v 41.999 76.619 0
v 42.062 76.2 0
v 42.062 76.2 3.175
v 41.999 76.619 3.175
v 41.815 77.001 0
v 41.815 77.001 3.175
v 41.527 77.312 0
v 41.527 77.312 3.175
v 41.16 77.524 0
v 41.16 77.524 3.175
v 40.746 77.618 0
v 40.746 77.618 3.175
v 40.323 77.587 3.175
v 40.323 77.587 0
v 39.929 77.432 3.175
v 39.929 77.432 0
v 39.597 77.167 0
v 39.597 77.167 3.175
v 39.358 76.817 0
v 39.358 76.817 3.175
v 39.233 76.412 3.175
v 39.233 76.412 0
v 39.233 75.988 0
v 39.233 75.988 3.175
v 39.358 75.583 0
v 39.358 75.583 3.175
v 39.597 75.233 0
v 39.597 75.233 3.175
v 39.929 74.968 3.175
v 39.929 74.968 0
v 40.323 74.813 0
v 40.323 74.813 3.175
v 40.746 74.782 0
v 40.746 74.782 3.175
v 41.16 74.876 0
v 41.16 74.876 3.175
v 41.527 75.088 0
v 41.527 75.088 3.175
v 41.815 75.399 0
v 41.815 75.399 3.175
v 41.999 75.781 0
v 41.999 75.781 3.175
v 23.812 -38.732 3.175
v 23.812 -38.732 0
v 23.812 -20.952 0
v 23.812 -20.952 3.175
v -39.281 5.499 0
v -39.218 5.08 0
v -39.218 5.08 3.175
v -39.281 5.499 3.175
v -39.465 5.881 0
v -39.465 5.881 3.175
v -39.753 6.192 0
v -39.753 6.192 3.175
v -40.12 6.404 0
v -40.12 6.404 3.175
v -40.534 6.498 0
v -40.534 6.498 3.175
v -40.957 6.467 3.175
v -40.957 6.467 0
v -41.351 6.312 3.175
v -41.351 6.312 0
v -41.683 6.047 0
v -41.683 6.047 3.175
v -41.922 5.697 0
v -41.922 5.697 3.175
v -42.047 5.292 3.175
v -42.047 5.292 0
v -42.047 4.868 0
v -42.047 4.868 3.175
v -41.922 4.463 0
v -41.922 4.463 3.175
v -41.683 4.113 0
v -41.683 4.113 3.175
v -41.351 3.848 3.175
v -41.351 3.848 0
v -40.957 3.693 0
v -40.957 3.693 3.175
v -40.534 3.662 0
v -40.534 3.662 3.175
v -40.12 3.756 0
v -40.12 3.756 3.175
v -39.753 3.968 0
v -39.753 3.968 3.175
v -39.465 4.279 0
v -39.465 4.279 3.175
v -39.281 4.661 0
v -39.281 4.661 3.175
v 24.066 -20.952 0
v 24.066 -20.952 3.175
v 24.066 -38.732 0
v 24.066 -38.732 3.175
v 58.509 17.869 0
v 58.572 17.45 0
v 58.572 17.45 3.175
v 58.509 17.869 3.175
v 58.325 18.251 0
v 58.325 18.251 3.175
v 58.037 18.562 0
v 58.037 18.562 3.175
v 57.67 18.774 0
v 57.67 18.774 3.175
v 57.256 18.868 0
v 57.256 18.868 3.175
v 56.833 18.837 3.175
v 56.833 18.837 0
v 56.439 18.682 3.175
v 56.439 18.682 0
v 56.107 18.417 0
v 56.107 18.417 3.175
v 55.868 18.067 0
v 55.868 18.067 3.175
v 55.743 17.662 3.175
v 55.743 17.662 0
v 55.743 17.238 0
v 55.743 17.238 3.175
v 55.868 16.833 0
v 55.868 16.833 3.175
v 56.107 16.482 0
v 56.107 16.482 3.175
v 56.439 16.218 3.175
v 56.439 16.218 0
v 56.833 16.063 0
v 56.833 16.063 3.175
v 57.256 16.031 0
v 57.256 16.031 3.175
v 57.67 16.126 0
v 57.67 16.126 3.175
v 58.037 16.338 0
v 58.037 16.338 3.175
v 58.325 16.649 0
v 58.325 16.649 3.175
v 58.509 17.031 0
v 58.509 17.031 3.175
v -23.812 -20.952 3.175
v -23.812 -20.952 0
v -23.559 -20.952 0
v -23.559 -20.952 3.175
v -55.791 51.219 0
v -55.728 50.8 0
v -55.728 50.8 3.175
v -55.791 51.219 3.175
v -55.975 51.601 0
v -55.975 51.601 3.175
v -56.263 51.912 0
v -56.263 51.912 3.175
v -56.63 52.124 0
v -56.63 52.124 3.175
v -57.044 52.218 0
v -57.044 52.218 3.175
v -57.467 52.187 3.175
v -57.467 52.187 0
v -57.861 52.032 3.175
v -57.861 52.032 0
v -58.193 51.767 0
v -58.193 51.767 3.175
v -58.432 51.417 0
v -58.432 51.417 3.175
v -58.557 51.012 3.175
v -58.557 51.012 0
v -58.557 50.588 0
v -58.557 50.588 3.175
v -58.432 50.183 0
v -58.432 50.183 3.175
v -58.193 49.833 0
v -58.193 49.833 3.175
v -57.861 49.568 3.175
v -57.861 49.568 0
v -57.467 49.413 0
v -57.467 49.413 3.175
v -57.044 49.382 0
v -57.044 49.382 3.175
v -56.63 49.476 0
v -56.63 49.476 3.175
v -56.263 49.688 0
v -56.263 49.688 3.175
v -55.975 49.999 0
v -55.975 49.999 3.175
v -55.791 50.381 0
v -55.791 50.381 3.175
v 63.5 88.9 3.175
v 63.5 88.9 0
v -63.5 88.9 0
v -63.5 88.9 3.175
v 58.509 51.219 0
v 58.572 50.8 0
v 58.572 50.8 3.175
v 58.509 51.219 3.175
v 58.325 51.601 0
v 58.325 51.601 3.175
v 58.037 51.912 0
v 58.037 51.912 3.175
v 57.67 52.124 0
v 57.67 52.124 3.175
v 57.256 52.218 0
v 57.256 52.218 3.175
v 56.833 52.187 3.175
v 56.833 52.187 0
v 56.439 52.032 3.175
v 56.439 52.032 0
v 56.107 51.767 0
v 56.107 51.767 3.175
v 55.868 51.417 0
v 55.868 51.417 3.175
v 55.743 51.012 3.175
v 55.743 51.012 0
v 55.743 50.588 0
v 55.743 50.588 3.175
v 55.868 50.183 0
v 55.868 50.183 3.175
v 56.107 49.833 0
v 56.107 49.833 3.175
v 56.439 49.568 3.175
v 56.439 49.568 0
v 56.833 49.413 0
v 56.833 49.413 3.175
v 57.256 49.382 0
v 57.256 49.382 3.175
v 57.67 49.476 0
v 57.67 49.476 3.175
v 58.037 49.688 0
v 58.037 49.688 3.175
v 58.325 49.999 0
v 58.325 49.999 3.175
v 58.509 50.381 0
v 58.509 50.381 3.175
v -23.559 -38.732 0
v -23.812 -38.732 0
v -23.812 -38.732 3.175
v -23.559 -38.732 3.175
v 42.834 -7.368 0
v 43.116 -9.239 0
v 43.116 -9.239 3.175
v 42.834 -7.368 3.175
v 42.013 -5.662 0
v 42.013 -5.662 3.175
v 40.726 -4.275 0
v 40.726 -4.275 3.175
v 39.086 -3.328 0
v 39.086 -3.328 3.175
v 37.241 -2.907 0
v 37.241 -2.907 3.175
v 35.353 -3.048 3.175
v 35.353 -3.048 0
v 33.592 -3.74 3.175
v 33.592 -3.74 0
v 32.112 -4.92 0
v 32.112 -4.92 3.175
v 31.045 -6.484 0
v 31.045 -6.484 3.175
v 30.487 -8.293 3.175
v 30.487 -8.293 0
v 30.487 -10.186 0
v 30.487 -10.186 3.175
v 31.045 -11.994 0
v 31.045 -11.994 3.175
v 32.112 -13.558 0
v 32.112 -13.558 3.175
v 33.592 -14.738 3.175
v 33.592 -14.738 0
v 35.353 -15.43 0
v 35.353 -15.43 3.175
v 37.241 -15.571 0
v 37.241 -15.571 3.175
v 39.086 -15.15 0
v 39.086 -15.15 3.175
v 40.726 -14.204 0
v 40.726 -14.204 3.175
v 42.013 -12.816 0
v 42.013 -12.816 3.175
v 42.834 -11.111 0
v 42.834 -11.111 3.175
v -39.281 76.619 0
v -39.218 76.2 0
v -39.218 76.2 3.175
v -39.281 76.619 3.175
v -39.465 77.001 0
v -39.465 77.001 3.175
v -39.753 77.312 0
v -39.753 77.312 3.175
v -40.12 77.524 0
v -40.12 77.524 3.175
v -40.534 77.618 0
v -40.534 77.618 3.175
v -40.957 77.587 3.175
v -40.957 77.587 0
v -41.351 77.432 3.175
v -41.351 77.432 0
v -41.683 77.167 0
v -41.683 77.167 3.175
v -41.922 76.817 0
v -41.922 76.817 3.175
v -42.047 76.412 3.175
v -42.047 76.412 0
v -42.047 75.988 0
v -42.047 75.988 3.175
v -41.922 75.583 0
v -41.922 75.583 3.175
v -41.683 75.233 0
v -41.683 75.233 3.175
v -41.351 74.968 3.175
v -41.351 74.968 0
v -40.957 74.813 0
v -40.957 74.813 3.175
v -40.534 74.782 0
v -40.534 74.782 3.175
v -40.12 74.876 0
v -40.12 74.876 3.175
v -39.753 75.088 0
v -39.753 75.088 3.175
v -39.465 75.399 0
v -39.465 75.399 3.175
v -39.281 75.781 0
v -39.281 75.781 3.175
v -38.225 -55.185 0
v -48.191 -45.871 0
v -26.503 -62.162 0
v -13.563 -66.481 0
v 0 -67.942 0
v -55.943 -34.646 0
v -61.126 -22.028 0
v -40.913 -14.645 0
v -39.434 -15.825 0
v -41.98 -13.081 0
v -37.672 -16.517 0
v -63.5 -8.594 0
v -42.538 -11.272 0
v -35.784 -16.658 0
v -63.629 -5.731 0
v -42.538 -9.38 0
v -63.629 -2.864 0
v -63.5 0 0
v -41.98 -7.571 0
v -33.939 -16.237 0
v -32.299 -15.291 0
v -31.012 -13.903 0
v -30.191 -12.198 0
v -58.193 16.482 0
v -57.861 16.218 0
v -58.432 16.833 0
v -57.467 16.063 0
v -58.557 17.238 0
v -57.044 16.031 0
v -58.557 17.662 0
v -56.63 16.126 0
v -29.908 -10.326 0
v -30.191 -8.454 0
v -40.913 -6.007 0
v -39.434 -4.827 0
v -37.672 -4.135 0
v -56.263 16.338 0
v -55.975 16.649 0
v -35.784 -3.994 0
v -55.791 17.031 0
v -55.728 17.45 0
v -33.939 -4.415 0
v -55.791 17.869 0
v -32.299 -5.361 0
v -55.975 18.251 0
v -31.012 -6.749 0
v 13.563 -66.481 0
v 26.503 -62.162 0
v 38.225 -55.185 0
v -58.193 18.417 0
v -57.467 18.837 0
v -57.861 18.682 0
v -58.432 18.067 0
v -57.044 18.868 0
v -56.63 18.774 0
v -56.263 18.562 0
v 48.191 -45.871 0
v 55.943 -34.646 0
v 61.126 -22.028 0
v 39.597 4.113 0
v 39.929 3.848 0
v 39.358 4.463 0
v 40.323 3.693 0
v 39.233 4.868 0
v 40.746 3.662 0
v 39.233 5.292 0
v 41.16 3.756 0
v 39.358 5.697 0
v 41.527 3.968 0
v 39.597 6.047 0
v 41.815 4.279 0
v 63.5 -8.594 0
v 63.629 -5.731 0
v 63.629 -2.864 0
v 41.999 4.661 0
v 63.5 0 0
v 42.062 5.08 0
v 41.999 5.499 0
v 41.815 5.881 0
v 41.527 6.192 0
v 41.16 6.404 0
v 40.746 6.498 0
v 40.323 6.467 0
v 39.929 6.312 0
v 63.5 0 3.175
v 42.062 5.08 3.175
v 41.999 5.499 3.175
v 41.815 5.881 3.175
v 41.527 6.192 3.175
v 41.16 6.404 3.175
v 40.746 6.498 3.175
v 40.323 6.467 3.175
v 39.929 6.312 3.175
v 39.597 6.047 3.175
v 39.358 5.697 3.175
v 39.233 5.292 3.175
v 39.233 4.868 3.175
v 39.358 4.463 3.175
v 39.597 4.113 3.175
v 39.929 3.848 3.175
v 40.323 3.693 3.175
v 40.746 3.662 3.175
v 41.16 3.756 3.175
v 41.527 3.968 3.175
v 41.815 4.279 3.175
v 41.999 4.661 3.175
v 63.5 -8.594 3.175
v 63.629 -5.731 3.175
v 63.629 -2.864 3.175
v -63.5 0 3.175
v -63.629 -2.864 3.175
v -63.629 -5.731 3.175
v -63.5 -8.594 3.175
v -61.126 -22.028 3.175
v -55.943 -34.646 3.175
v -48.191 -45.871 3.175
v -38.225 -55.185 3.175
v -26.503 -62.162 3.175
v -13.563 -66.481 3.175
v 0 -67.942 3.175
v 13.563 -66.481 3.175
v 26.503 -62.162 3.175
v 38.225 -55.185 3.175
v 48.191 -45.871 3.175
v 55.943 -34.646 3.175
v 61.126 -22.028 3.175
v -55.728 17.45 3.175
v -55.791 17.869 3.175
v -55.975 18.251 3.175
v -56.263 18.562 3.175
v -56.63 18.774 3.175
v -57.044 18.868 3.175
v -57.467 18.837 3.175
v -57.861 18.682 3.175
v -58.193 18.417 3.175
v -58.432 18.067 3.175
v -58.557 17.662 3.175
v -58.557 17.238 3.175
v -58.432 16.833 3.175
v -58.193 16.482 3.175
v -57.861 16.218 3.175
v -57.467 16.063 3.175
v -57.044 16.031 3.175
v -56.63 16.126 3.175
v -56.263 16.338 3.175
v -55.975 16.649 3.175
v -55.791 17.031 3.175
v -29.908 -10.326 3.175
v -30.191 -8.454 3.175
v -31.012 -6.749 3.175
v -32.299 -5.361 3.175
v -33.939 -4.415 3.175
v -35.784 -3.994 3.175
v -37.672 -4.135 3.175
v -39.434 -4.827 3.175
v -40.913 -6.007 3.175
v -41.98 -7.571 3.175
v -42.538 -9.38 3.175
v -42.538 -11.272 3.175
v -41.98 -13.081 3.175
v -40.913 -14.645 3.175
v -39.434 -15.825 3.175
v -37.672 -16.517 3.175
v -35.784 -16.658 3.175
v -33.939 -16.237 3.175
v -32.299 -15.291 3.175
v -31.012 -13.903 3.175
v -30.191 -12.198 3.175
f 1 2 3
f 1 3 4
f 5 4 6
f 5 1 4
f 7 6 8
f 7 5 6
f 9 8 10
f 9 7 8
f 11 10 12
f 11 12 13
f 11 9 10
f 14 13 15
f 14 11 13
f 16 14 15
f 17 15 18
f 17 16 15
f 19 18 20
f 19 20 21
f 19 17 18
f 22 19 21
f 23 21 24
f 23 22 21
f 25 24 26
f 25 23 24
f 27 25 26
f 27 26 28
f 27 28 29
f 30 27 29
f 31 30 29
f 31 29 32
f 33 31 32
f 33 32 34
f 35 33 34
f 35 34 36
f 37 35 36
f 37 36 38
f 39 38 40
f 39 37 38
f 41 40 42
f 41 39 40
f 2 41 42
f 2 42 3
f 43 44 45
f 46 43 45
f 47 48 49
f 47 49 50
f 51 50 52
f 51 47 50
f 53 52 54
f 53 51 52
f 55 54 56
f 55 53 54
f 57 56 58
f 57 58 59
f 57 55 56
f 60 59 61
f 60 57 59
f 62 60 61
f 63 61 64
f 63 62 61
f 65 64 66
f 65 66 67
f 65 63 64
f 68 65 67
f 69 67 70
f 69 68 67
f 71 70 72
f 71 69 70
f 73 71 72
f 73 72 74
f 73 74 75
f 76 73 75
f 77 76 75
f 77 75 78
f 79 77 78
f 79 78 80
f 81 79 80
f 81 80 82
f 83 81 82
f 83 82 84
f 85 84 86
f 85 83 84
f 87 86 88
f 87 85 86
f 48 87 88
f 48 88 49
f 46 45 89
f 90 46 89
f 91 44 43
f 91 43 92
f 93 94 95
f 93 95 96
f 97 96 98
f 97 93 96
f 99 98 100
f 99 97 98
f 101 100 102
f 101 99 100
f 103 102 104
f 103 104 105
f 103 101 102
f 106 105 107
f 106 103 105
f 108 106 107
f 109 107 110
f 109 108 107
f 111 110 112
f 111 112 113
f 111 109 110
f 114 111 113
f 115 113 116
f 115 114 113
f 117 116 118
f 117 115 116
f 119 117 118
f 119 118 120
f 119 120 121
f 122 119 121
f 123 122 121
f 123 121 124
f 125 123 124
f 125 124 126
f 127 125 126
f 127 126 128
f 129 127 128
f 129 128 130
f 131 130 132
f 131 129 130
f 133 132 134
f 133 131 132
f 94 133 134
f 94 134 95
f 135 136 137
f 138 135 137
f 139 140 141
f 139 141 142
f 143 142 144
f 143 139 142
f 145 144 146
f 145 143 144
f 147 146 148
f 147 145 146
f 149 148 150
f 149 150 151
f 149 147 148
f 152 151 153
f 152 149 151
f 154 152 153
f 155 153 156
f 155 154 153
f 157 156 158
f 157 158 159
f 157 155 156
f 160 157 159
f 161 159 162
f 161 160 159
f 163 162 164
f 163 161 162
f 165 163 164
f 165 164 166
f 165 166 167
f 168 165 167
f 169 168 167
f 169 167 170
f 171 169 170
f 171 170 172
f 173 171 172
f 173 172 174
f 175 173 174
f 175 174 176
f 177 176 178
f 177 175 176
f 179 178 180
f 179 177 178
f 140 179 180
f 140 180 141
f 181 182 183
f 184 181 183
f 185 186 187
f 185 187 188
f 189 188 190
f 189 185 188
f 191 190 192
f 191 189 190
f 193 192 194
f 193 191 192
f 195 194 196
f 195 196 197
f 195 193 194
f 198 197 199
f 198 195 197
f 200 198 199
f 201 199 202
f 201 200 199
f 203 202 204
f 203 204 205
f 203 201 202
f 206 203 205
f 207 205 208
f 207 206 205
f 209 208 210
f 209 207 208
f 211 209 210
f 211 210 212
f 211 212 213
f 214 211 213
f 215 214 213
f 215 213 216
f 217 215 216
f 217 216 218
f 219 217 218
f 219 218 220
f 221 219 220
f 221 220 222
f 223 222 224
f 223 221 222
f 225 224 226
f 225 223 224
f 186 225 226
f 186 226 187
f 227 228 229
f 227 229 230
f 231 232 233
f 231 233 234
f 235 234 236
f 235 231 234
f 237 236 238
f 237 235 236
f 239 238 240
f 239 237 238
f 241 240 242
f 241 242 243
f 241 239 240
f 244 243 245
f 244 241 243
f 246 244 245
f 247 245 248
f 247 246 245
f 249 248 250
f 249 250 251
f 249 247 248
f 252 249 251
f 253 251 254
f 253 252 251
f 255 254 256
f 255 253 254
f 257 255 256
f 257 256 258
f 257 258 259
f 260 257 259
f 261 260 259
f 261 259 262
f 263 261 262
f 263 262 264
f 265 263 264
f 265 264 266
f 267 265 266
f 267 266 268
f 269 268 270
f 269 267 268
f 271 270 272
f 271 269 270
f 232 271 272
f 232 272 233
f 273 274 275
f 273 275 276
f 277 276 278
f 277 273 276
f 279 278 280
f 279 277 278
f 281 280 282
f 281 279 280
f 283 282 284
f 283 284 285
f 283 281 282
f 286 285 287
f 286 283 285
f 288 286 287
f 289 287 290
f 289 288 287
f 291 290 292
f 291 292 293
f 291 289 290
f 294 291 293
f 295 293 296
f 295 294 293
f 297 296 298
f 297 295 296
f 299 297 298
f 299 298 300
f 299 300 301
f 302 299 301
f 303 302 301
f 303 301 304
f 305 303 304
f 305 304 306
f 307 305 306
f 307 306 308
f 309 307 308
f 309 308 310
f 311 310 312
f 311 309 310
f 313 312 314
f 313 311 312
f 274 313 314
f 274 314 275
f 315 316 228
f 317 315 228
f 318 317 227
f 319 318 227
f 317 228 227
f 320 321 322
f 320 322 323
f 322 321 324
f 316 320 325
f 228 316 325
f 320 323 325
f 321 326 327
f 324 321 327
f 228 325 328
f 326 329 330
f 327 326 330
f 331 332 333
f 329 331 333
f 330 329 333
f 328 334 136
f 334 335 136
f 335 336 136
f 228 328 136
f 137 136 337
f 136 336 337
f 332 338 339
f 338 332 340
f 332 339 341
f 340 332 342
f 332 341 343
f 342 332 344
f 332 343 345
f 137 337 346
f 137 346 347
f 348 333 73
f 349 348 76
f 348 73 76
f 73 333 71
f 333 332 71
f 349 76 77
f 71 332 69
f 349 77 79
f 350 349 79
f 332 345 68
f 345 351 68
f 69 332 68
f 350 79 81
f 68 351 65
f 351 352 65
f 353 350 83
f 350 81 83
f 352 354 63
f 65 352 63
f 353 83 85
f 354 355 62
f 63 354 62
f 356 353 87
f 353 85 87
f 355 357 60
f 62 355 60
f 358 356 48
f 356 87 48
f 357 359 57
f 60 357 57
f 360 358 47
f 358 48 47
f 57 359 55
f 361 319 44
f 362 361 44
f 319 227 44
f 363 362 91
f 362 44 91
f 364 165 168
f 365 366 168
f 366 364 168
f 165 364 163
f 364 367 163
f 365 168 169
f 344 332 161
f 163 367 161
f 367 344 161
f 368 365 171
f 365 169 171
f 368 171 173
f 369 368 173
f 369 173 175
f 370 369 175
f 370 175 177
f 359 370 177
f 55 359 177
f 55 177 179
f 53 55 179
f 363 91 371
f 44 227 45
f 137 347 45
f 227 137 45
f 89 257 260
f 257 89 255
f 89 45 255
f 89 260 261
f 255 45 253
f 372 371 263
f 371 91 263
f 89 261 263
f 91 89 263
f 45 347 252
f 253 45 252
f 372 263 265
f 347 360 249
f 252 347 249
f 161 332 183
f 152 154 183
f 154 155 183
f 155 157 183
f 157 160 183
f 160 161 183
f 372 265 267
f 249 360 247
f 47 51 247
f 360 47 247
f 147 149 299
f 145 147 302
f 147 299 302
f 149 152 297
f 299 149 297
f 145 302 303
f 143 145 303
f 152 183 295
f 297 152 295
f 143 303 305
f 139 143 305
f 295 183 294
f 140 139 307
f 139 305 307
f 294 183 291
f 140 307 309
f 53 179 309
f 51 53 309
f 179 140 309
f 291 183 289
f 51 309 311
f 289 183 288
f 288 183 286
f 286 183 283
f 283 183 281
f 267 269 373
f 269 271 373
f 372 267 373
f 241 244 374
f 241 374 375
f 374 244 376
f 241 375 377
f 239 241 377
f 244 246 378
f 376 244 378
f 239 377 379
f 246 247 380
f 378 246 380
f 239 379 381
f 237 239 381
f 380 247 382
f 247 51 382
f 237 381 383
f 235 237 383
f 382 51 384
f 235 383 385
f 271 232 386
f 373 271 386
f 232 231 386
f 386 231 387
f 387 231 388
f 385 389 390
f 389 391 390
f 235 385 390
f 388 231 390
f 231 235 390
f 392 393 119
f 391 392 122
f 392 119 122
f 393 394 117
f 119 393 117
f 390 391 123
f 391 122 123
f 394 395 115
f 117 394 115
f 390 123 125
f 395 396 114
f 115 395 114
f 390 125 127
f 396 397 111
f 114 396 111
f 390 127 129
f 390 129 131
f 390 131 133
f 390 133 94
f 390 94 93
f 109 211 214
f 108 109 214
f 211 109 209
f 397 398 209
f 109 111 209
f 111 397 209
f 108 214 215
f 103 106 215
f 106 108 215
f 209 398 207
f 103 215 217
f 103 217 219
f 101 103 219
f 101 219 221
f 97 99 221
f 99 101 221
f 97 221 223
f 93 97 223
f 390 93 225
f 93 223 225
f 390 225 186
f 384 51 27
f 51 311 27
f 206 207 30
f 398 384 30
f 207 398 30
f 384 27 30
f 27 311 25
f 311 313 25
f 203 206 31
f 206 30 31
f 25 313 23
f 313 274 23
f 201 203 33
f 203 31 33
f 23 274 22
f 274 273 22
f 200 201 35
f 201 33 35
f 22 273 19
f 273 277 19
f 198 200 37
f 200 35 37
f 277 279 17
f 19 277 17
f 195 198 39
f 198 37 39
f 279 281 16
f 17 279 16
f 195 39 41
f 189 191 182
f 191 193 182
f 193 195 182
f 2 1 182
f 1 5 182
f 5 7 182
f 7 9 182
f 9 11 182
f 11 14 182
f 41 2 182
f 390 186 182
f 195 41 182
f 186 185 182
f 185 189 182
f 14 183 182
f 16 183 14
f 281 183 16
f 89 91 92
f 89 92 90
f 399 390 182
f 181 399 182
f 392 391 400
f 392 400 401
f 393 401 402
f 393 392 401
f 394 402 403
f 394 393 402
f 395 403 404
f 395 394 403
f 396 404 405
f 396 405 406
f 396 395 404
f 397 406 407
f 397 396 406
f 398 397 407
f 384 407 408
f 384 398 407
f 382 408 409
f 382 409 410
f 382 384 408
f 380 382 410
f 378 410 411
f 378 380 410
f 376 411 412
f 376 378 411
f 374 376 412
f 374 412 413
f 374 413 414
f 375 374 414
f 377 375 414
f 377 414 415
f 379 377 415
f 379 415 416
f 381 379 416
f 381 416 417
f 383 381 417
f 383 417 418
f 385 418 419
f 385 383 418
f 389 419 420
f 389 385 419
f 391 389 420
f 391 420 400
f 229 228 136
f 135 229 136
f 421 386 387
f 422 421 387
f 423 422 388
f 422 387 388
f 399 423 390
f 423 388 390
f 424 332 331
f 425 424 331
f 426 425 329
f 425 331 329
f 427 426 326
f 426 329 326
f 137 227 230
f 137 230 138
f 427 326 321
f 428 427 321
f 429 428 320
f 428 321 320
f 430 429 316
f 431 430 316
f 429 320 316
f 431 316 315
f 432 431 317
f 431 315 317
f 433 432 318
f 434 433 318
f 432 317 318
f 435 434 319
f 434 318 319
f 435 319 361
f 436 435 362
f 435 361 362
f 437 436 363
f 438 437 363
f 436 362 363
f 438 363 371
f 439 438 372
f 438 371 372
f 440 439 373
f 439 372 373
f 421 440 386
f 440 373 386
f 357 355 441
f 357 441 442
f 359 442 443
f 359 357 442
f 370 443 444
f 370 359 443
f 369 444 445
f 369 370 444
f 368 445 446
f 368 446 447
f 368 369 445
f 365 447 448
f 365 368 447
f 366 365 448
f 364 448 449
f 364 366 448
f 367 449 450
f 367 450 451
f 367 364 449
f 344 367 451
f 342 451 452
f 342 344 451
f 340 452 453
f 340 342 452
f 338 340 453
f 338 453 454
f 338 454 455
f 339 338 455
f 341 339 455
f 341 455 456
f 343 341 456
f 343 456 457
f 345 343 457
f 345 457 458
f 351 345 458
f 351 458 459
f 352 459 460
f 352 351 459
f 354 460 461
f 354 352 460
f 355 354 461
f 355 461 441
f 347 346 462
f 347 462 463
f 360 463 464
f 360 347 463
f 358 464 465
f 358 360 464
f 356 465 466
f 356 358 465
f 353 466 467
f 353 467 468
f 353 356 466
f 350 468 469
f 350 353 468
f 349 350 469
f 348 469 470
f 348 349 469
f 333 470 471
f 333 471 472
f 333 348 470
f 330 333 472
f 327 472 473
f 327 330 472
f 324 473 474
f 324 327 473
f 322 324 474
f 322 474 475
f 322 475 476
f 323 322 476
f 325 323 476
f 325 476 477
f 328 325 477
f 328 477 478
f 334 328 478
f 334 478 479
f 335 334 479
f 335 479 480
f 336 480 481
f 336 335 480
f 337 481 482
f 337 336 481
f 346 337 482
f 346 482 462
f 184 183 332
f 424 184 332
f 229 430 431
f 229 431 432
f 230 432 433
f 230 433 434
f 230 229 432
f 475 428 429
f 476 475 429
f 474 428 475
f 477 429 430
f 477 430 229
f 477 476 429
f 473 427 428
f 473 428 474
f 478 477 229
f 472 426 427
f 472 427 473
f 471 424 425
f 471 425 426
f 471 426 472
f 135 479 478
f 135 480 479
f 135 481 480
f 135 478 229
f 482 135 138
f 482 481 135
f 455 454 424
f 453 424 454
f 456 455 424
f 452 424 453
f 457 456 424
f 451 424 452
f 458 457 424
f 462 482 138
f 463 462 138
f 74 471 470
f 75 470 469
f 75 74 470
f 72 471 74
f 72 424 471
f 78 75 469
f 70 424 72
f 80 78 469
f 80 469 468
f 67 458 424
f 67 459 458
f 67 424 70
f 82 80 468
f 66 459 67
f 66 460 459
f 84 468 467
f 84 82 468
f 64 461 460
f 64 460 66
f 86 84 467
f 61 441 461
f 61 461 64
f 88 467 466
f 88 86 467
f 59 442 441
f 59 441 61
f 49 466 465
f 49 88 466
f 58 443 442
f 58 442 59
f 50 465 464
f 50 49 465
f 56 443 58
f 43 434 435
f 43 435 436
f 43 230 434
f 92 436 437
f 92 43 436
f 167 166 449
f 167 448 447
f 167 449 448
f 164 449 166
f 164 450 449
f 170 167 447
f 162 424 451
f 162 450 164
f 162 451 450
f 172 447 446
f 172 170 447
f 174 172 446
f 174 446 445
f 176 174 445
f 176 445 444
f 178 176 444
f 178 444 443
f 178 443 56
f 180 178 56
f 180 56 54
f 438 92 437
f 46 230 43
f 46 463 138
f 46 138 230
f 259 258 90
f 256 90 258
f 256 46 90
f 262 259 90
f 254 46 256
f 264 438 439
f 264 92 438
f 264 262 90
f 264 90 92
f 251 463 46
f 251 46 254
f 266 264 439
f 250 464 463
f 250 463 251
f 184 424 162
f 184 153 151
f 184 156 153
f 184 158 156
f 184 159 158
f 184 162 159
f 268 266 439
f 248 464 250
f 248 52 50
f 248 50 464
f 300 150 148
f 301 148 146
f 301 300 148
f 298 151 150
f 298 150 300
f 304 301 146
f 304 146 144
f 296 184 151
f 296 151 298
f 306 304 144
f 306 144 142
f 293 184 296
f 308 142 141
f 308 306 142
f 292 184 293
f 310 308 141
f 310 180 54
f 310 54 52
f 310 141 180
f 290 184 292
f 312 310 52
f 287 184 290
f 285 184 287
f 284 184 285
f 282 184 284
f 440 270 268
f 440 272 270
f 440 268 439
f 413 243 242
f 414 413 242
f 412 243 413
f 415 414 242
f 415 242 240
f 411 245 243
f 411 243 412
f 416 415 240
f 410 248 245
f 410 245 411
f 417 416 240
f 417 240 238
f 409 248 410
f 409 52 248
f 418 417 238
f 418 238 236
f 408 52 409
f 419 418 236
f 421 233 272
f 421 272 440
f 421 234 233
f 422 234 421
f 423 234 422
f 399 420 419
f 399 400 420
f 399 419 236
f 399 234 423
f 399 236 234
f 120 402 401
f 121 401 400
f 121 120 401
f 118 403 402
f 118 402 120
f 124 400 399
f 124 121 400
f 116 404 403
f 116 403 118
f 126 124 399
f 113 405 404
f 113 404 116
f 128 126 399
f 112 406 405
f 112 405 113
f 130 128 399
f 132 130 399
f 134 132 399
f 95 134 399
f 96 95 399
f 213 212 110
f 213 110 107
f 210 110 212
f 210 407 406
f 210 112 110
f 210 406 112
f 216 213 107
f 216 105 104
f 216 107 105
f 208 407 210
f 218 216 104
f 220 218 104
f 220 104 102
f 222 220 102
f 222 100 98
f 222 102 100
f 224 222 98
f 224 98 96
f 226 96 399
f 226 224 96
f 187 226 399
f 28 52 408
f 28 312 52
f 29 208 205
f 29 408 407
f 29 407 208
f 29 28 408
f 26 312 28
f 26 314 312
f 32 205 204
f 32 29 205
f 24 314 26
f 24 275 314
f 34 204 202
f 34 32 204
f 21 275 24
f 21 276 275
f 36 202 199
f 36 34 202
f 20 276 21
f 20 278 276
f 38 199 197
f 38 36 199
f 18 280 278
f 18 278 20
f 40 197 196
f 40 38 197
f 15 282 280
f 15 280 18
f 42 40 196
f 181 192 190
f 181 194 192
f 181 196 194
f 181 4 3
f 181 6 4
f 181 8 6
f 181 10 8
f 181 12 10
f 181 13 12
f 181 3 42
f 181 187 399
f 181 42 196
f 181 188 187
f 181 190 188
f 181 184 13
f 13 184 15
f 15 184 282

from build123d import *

# Parameters (mm, degrees)
F0_W     = 0.254
F0_H     = 17.78
F0_R     = 6.35
F0_R_2   = 1.4224
F1_DEPTH = 3.175


with BuildPart() as f1:
    # F0 (on Top) → F1 (new body)
    with BuildSketch(Plane.XY):
        with BuildLine():
            Line((63.5, 0), (63.5, 88.9))
            Line((63.5, 88.9), (-63.5, 88.9))
            Line((-63.5, 88.9), (-63.5, 0))
            Line((-63.5, 0), (-63.5, -8.594495))
            ThreePointArc((-63.5, -8.594495), (0, -67.942486), (63.5, -8.594495))
            Line((63.5, -8.594495), (63.5, 0))
        make_face()
        with Locations((-23.6855, -29.842486)):
            Rectangle(F0_W, F0_H, mode=Mode.SUBTRACT)
        with Locations((-36.2585, -10.325997)):
            Circle(F0_R, mode=Mode.SUBTRACT)
        with Locations((-40.64, 5.08)):
            Circle(F0_R_2, mode=Mode.SUBTRACT)
        with Locations((23.9395, -29.842486)):
            Rectangle(F0_W, F0_H, mode=Mode.SUBTRACT)
        with Locations((36.7665, -9.239232)):
            Circle(F0_R, mode=Mode.SUBTRACT)
        with Locations((40.64, 5.08)):
            Circle(F0_R_2, mode=Mode.SUBTRACT)
        with Locations((-57.15, 17.4498)):
            Circle(F0_R_2, mode=Mode.SUBTRACT)
        with Locations((-57.15, 50.8)):
            Circle(F0_R_2, mode=Mode.SUBTRACT)
        with Locations((-40.64, 76.2)):
            Circle(F0_R_2, mode=Mode.SUBTRACT)
        with Locations((57.15, 17.4498)):
            Circle(F0_R_2, mode=Mode.SUBTRACT)
        with Locations((57.15, 50.8)):
            Circle(F0_R_2, mode=Mode.SUBTRACT)
        with Locations((40.64, 76.2)):
            Circle(F0_R_2, mode=Mode.SUBTRACT)
        with BuildLine():
            ThreePointArc((63.5, -8.594495), (63.645238, -4.297248), (63.5, 0))
            Line((63.5, 0), (63.5, -8.594495))
        make_face()
        with BuildLine():
            Line((-63.5, -8.594495), (-63.5, 0))
            ThreePointArc((-63.5, 0), (-63.645238, -4.297248), (-63.5, -8.594495))
        make_face()
    extrude(amount=F1_DEPTH)


solid = f1.part
